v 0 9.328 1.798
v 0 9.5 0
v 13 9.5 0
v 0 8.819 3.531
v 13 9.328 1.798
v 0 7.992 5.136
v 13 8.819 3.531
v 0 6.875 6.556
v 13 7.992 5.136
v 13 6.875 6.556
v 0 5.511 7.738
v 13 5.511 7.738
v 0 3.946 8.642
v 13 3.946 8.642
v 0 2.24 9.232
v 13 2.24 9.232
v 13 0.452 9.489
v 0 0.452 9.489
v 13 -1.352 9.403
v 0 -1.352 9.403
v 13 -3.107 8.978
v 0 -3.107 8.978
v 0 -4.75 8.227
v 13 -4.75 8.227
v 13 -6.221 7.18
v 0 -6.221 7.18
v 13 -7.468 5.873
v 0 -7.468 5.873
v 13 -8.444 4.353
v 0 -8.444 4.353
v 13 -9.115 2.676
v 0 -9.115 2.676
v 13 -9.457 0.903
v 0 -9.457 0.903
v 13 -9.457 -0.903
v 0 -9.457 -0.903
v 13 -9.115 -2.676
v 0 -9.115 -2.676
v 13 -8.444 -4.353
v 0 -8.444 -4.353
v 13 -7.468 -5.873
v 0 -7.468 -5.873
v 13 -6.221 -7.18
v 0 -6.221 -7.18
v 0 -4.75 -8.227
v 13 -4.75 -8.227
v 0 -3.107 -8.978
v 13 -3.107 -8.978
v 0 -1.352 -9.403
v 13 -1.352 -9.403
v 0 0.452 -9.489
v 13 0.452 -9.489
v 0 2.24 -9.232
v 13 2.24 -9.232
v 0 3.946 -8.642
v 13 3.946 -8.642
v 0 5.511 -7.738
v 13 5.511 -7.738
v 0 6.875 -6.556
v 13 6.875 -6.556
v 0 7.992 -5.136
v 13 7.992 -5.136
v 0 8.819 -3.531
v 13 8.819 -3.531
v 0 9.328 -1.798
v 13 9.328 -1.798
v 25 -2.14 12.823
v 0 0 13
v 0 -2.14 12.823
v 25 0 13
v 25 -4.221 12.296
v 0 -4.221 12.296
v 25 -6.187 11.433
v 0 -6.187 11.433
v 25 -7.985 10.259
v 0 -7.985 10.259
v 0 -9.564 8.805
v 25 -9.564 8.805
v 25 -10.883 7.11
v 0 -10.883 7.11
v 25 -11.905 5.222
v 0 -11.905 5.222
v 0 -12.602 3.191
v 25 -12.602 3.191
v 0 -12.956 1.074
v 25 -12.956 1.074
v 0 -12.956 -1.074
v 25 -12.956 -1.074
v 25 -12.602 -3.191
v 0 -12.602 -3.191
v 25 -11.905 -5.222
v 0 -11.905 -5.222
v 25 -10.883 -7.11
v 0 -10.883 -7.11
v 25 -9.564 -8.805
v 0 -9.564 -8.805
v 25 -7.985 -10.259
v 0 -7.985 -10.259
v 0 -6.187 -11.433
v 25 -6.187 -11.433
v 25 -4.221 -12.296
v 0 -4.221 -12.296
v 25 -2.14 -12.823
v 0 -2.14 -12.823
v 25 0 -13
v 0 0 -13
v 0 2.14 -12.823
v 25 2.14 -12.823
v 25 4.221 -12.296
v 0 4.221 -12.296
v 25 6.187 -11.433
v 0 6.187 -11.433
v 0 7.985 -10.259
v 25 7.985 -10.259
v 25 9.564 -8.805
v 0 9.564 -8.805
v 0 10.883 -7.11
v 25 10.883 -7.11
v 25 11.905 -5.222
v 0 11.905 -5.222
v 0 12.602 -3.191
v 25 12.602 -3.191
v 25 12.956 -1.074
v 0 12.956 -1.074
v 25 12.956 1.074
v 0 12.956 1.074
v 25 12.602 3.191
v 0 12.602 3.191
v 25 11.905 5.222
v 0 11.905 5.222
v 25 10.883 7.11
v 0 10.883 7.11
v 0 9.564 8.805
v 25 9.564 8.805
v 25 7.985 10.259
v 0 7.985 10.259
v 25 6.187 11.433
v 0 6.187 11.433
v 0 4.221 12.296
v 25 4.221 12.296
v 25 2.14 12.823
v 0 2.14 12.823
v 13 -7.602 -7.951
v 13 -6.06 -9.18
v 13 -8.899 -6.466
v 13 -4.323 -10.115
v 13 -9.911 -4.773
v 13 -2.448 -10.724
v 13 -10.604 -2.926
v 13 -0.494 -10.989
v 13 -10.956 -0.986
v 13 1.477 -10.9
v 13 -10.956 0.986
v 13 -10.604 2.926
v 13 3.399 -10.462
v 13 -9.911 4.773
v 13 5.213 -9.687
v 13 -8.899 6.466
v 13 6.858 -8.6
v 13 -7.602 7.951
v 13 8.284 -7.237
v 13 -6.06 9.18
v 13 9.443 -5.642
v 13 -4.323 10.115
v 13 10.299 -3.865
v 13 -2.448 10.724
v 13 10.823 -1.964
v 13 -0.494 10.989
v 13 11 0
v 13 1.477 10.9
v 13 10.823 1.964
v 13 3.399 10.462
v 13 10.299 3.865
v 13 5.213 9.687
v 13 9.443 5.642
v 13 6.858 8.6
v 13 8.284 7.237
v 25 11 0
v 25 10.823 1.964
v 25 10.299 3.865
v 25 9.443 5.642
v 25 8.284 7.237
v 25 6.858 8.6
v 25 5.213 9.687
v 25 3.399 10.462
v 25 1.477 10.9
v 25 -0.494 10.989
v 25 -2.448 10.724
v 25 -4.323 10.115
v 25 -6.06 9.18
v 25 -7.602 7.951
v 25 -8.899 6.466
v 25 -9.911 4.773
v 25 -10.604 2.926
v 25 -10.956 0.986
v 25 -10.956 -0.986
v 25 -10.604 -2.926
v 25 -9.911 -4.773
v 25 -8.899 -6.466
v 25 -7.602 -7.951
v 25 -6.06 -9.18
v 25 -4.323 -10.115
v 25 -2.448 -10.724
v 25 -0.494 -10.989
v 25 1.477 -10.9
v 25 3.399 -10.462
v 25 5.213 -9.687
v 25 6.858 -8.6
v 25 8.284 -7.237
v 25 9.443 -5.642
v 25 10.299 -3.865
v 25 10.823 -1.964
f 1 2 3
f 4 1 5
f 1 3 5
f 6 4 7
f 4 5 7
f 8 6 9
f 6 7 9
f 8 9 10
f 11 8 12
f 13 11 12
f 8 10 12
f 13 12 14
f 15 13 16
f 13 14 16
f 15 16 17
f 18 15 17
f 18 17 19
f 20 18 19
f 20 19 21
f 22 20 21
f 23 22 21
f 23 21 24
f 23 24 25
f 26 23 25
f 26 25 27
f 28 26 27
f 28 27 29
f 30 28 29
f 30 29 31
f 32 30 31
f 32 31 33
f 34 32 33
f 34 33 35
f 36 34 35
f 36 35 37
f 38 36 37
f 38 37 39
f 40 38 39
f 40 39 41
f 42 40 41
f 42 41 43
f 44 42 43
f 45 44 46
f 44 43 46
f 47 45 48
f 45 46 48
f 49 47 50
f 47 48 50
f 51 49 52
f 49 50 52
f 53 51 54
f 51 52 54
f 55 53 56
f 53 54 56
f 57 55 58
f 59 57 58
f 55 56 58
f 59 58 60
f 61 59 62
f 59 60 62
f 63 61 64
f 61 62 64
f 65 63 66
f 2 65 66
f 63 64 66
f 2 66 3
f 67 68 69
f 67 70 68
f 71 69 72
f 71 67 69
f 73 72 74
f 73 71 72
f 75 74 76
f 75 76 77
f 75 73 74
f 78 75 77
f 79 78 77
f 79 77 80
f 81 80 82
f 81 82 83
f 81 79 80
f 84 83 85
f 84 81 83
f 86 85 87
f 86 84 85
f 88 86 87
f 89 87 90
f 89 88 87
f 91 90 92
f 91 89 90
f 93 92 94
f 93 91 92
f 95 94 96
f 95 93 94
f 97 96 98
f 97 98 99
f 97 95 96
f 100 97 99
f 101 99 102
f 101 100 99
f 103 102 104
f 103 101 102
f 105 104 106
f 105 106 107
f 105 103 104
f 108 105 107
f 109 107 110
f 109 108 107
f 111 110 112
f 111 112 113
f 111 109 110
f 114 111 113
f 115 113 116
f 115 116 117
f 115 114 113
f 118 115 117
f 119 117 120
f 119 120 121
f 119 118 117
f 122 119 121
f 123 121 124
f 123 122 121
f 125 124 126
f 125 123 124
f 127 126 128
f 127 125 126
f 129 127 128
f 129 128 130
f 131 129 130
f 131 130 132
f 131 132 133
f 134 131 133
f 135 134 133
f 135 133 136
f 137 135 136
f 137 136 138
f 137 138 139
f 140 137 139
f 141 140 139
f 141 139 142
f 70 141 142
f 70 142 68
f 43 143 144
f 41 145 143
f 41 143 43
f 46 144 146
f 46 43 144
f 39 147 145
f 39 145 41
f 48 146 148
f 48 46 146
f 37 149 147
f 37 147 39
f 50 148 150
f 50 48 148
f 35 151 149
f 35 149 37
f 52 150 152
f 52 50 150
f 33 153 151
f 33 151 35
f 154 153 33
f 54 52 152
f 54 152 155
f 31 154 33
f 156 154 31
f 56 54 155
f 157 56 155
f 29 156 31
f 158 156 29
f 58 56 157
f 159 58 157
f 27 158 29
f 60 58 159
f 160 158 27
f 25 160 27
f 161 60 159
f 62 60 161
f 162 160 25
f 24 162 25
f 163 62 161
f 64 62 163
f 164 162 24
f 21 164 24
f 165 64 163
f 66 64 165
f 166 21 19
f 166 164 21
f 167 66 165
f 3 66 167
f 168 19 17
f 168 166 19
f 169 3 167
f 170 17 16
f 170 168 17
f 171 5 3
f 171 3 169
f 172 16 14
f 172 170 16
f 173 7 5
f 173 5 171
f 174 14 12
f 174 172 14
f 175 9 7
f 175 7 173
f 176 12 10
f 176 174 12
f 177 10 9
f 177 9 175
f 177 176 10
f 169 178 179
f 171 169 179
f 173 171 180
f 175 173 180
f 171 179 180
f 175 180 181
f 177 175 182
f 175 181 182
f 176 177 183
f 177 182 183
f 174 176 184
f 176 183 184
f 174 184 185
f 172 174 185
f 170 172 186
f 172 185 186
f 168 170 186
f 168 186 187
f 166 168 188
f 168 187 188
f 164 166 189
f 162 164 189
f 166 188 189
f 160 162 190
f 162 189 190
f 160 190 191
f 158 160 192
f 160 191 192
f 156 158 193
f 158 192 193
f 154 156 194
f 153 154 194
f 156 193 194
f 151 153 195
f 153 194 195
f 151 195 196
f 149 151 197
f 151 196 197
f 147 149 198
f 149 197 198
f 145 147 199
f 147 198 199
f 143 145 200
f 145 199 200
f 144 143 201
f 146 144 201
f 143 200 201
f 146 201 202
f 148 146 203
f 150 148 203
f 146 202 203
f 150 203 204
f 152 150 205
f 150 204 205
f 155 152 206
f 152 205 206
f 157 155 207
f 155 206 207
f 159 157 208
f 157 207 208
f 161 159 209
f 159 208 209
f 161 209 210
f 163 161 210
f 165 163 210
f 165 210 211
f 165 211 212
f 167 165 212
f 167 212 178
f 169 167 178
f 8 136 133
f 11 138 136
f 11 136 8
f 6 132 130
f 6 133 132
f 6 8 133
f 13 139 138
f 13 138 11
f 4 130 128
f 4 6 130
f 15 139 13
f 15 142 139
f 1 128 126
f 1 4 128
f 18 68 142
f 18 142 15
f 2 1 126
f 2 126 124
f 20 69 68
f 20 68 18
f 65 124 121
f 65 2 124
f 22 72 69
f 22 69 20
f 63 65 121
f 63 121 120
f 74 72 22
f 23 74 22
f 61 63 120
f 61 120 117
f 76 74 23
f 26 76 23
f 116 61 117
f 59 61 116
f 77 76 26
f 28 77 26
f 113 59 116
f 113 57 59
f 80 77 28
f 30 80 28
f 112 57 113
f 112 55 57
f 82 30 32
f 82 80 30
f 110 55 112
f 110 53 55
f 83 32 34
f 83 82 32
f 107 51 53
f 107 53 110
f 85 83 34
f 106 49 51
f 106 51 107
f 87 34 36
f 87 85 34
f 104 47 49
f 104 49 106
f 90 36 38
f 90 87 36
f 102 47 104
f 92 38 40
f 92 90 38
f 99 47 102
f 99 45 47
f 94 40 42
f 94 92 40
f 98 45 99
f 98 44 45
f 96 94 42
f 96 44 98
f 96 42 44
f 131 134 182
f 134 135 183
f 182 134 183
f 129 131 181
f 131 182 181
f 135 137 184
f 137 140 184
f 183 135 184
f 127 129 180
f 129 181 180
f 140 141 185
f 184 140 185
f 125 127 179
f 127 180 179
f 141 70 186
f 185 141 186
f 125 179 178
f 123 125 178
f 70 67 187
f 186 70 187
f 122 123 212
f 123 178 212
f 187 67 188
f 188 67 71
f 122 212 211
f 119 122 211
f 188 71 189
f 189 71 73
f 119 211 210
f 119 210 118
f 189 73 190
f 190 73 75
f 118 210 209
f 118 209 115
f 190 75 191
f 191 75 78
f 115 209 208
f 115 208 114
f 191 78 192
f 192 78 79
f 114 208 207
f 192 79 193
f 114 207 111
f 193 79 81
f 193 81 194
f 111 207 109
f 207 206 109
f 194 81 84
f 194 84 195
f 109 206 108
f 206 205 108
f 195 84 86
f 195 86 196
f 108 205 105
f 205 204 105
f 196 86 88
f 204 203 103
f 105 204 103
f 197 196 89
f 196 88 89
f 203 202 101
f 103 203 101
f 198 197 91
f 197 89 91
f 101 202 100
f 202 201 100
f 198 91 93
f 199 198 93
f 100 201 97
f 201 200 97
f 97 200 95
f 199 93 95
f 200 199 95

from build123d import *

# Parameters (mm, degrees)
F0_W     = 25
F0_H     = 13
F2_R     = 9.5
F3_DEPTH = 57.5
F2_R_2   = 11
F4_DEPTH = 12


with BuildPart() as f1:
    # F0 (on Front) → F1 (revolve)
    with BuildSketch(Plane.XZ):
        with Locations((12.5, 6.5)):
            Rectangle(F0_W, F0_H)
    revolve(axis=Axis((12.5, 0, 0), (1, 0, 0)))

    # F2 (on face) → F3 (cut)
    with BuildSketch(Plane.YZ.offset(25)):
        Circle(F2_R)
    extrude(amount=-F3_DEPTH, mode=Mode.SUBTRACT)

    # F2 (on face) → F4 (cut)
    with BuildSketch(Plane.YZ.offset(25)):
        Circle(F2_R_2)
        Circle(F2_R, mode=Mode.SUBTRACT)
    extrude(amount=-F4_DEPTH, mode=Mode.SUBTRACT)


solid = f1.part
